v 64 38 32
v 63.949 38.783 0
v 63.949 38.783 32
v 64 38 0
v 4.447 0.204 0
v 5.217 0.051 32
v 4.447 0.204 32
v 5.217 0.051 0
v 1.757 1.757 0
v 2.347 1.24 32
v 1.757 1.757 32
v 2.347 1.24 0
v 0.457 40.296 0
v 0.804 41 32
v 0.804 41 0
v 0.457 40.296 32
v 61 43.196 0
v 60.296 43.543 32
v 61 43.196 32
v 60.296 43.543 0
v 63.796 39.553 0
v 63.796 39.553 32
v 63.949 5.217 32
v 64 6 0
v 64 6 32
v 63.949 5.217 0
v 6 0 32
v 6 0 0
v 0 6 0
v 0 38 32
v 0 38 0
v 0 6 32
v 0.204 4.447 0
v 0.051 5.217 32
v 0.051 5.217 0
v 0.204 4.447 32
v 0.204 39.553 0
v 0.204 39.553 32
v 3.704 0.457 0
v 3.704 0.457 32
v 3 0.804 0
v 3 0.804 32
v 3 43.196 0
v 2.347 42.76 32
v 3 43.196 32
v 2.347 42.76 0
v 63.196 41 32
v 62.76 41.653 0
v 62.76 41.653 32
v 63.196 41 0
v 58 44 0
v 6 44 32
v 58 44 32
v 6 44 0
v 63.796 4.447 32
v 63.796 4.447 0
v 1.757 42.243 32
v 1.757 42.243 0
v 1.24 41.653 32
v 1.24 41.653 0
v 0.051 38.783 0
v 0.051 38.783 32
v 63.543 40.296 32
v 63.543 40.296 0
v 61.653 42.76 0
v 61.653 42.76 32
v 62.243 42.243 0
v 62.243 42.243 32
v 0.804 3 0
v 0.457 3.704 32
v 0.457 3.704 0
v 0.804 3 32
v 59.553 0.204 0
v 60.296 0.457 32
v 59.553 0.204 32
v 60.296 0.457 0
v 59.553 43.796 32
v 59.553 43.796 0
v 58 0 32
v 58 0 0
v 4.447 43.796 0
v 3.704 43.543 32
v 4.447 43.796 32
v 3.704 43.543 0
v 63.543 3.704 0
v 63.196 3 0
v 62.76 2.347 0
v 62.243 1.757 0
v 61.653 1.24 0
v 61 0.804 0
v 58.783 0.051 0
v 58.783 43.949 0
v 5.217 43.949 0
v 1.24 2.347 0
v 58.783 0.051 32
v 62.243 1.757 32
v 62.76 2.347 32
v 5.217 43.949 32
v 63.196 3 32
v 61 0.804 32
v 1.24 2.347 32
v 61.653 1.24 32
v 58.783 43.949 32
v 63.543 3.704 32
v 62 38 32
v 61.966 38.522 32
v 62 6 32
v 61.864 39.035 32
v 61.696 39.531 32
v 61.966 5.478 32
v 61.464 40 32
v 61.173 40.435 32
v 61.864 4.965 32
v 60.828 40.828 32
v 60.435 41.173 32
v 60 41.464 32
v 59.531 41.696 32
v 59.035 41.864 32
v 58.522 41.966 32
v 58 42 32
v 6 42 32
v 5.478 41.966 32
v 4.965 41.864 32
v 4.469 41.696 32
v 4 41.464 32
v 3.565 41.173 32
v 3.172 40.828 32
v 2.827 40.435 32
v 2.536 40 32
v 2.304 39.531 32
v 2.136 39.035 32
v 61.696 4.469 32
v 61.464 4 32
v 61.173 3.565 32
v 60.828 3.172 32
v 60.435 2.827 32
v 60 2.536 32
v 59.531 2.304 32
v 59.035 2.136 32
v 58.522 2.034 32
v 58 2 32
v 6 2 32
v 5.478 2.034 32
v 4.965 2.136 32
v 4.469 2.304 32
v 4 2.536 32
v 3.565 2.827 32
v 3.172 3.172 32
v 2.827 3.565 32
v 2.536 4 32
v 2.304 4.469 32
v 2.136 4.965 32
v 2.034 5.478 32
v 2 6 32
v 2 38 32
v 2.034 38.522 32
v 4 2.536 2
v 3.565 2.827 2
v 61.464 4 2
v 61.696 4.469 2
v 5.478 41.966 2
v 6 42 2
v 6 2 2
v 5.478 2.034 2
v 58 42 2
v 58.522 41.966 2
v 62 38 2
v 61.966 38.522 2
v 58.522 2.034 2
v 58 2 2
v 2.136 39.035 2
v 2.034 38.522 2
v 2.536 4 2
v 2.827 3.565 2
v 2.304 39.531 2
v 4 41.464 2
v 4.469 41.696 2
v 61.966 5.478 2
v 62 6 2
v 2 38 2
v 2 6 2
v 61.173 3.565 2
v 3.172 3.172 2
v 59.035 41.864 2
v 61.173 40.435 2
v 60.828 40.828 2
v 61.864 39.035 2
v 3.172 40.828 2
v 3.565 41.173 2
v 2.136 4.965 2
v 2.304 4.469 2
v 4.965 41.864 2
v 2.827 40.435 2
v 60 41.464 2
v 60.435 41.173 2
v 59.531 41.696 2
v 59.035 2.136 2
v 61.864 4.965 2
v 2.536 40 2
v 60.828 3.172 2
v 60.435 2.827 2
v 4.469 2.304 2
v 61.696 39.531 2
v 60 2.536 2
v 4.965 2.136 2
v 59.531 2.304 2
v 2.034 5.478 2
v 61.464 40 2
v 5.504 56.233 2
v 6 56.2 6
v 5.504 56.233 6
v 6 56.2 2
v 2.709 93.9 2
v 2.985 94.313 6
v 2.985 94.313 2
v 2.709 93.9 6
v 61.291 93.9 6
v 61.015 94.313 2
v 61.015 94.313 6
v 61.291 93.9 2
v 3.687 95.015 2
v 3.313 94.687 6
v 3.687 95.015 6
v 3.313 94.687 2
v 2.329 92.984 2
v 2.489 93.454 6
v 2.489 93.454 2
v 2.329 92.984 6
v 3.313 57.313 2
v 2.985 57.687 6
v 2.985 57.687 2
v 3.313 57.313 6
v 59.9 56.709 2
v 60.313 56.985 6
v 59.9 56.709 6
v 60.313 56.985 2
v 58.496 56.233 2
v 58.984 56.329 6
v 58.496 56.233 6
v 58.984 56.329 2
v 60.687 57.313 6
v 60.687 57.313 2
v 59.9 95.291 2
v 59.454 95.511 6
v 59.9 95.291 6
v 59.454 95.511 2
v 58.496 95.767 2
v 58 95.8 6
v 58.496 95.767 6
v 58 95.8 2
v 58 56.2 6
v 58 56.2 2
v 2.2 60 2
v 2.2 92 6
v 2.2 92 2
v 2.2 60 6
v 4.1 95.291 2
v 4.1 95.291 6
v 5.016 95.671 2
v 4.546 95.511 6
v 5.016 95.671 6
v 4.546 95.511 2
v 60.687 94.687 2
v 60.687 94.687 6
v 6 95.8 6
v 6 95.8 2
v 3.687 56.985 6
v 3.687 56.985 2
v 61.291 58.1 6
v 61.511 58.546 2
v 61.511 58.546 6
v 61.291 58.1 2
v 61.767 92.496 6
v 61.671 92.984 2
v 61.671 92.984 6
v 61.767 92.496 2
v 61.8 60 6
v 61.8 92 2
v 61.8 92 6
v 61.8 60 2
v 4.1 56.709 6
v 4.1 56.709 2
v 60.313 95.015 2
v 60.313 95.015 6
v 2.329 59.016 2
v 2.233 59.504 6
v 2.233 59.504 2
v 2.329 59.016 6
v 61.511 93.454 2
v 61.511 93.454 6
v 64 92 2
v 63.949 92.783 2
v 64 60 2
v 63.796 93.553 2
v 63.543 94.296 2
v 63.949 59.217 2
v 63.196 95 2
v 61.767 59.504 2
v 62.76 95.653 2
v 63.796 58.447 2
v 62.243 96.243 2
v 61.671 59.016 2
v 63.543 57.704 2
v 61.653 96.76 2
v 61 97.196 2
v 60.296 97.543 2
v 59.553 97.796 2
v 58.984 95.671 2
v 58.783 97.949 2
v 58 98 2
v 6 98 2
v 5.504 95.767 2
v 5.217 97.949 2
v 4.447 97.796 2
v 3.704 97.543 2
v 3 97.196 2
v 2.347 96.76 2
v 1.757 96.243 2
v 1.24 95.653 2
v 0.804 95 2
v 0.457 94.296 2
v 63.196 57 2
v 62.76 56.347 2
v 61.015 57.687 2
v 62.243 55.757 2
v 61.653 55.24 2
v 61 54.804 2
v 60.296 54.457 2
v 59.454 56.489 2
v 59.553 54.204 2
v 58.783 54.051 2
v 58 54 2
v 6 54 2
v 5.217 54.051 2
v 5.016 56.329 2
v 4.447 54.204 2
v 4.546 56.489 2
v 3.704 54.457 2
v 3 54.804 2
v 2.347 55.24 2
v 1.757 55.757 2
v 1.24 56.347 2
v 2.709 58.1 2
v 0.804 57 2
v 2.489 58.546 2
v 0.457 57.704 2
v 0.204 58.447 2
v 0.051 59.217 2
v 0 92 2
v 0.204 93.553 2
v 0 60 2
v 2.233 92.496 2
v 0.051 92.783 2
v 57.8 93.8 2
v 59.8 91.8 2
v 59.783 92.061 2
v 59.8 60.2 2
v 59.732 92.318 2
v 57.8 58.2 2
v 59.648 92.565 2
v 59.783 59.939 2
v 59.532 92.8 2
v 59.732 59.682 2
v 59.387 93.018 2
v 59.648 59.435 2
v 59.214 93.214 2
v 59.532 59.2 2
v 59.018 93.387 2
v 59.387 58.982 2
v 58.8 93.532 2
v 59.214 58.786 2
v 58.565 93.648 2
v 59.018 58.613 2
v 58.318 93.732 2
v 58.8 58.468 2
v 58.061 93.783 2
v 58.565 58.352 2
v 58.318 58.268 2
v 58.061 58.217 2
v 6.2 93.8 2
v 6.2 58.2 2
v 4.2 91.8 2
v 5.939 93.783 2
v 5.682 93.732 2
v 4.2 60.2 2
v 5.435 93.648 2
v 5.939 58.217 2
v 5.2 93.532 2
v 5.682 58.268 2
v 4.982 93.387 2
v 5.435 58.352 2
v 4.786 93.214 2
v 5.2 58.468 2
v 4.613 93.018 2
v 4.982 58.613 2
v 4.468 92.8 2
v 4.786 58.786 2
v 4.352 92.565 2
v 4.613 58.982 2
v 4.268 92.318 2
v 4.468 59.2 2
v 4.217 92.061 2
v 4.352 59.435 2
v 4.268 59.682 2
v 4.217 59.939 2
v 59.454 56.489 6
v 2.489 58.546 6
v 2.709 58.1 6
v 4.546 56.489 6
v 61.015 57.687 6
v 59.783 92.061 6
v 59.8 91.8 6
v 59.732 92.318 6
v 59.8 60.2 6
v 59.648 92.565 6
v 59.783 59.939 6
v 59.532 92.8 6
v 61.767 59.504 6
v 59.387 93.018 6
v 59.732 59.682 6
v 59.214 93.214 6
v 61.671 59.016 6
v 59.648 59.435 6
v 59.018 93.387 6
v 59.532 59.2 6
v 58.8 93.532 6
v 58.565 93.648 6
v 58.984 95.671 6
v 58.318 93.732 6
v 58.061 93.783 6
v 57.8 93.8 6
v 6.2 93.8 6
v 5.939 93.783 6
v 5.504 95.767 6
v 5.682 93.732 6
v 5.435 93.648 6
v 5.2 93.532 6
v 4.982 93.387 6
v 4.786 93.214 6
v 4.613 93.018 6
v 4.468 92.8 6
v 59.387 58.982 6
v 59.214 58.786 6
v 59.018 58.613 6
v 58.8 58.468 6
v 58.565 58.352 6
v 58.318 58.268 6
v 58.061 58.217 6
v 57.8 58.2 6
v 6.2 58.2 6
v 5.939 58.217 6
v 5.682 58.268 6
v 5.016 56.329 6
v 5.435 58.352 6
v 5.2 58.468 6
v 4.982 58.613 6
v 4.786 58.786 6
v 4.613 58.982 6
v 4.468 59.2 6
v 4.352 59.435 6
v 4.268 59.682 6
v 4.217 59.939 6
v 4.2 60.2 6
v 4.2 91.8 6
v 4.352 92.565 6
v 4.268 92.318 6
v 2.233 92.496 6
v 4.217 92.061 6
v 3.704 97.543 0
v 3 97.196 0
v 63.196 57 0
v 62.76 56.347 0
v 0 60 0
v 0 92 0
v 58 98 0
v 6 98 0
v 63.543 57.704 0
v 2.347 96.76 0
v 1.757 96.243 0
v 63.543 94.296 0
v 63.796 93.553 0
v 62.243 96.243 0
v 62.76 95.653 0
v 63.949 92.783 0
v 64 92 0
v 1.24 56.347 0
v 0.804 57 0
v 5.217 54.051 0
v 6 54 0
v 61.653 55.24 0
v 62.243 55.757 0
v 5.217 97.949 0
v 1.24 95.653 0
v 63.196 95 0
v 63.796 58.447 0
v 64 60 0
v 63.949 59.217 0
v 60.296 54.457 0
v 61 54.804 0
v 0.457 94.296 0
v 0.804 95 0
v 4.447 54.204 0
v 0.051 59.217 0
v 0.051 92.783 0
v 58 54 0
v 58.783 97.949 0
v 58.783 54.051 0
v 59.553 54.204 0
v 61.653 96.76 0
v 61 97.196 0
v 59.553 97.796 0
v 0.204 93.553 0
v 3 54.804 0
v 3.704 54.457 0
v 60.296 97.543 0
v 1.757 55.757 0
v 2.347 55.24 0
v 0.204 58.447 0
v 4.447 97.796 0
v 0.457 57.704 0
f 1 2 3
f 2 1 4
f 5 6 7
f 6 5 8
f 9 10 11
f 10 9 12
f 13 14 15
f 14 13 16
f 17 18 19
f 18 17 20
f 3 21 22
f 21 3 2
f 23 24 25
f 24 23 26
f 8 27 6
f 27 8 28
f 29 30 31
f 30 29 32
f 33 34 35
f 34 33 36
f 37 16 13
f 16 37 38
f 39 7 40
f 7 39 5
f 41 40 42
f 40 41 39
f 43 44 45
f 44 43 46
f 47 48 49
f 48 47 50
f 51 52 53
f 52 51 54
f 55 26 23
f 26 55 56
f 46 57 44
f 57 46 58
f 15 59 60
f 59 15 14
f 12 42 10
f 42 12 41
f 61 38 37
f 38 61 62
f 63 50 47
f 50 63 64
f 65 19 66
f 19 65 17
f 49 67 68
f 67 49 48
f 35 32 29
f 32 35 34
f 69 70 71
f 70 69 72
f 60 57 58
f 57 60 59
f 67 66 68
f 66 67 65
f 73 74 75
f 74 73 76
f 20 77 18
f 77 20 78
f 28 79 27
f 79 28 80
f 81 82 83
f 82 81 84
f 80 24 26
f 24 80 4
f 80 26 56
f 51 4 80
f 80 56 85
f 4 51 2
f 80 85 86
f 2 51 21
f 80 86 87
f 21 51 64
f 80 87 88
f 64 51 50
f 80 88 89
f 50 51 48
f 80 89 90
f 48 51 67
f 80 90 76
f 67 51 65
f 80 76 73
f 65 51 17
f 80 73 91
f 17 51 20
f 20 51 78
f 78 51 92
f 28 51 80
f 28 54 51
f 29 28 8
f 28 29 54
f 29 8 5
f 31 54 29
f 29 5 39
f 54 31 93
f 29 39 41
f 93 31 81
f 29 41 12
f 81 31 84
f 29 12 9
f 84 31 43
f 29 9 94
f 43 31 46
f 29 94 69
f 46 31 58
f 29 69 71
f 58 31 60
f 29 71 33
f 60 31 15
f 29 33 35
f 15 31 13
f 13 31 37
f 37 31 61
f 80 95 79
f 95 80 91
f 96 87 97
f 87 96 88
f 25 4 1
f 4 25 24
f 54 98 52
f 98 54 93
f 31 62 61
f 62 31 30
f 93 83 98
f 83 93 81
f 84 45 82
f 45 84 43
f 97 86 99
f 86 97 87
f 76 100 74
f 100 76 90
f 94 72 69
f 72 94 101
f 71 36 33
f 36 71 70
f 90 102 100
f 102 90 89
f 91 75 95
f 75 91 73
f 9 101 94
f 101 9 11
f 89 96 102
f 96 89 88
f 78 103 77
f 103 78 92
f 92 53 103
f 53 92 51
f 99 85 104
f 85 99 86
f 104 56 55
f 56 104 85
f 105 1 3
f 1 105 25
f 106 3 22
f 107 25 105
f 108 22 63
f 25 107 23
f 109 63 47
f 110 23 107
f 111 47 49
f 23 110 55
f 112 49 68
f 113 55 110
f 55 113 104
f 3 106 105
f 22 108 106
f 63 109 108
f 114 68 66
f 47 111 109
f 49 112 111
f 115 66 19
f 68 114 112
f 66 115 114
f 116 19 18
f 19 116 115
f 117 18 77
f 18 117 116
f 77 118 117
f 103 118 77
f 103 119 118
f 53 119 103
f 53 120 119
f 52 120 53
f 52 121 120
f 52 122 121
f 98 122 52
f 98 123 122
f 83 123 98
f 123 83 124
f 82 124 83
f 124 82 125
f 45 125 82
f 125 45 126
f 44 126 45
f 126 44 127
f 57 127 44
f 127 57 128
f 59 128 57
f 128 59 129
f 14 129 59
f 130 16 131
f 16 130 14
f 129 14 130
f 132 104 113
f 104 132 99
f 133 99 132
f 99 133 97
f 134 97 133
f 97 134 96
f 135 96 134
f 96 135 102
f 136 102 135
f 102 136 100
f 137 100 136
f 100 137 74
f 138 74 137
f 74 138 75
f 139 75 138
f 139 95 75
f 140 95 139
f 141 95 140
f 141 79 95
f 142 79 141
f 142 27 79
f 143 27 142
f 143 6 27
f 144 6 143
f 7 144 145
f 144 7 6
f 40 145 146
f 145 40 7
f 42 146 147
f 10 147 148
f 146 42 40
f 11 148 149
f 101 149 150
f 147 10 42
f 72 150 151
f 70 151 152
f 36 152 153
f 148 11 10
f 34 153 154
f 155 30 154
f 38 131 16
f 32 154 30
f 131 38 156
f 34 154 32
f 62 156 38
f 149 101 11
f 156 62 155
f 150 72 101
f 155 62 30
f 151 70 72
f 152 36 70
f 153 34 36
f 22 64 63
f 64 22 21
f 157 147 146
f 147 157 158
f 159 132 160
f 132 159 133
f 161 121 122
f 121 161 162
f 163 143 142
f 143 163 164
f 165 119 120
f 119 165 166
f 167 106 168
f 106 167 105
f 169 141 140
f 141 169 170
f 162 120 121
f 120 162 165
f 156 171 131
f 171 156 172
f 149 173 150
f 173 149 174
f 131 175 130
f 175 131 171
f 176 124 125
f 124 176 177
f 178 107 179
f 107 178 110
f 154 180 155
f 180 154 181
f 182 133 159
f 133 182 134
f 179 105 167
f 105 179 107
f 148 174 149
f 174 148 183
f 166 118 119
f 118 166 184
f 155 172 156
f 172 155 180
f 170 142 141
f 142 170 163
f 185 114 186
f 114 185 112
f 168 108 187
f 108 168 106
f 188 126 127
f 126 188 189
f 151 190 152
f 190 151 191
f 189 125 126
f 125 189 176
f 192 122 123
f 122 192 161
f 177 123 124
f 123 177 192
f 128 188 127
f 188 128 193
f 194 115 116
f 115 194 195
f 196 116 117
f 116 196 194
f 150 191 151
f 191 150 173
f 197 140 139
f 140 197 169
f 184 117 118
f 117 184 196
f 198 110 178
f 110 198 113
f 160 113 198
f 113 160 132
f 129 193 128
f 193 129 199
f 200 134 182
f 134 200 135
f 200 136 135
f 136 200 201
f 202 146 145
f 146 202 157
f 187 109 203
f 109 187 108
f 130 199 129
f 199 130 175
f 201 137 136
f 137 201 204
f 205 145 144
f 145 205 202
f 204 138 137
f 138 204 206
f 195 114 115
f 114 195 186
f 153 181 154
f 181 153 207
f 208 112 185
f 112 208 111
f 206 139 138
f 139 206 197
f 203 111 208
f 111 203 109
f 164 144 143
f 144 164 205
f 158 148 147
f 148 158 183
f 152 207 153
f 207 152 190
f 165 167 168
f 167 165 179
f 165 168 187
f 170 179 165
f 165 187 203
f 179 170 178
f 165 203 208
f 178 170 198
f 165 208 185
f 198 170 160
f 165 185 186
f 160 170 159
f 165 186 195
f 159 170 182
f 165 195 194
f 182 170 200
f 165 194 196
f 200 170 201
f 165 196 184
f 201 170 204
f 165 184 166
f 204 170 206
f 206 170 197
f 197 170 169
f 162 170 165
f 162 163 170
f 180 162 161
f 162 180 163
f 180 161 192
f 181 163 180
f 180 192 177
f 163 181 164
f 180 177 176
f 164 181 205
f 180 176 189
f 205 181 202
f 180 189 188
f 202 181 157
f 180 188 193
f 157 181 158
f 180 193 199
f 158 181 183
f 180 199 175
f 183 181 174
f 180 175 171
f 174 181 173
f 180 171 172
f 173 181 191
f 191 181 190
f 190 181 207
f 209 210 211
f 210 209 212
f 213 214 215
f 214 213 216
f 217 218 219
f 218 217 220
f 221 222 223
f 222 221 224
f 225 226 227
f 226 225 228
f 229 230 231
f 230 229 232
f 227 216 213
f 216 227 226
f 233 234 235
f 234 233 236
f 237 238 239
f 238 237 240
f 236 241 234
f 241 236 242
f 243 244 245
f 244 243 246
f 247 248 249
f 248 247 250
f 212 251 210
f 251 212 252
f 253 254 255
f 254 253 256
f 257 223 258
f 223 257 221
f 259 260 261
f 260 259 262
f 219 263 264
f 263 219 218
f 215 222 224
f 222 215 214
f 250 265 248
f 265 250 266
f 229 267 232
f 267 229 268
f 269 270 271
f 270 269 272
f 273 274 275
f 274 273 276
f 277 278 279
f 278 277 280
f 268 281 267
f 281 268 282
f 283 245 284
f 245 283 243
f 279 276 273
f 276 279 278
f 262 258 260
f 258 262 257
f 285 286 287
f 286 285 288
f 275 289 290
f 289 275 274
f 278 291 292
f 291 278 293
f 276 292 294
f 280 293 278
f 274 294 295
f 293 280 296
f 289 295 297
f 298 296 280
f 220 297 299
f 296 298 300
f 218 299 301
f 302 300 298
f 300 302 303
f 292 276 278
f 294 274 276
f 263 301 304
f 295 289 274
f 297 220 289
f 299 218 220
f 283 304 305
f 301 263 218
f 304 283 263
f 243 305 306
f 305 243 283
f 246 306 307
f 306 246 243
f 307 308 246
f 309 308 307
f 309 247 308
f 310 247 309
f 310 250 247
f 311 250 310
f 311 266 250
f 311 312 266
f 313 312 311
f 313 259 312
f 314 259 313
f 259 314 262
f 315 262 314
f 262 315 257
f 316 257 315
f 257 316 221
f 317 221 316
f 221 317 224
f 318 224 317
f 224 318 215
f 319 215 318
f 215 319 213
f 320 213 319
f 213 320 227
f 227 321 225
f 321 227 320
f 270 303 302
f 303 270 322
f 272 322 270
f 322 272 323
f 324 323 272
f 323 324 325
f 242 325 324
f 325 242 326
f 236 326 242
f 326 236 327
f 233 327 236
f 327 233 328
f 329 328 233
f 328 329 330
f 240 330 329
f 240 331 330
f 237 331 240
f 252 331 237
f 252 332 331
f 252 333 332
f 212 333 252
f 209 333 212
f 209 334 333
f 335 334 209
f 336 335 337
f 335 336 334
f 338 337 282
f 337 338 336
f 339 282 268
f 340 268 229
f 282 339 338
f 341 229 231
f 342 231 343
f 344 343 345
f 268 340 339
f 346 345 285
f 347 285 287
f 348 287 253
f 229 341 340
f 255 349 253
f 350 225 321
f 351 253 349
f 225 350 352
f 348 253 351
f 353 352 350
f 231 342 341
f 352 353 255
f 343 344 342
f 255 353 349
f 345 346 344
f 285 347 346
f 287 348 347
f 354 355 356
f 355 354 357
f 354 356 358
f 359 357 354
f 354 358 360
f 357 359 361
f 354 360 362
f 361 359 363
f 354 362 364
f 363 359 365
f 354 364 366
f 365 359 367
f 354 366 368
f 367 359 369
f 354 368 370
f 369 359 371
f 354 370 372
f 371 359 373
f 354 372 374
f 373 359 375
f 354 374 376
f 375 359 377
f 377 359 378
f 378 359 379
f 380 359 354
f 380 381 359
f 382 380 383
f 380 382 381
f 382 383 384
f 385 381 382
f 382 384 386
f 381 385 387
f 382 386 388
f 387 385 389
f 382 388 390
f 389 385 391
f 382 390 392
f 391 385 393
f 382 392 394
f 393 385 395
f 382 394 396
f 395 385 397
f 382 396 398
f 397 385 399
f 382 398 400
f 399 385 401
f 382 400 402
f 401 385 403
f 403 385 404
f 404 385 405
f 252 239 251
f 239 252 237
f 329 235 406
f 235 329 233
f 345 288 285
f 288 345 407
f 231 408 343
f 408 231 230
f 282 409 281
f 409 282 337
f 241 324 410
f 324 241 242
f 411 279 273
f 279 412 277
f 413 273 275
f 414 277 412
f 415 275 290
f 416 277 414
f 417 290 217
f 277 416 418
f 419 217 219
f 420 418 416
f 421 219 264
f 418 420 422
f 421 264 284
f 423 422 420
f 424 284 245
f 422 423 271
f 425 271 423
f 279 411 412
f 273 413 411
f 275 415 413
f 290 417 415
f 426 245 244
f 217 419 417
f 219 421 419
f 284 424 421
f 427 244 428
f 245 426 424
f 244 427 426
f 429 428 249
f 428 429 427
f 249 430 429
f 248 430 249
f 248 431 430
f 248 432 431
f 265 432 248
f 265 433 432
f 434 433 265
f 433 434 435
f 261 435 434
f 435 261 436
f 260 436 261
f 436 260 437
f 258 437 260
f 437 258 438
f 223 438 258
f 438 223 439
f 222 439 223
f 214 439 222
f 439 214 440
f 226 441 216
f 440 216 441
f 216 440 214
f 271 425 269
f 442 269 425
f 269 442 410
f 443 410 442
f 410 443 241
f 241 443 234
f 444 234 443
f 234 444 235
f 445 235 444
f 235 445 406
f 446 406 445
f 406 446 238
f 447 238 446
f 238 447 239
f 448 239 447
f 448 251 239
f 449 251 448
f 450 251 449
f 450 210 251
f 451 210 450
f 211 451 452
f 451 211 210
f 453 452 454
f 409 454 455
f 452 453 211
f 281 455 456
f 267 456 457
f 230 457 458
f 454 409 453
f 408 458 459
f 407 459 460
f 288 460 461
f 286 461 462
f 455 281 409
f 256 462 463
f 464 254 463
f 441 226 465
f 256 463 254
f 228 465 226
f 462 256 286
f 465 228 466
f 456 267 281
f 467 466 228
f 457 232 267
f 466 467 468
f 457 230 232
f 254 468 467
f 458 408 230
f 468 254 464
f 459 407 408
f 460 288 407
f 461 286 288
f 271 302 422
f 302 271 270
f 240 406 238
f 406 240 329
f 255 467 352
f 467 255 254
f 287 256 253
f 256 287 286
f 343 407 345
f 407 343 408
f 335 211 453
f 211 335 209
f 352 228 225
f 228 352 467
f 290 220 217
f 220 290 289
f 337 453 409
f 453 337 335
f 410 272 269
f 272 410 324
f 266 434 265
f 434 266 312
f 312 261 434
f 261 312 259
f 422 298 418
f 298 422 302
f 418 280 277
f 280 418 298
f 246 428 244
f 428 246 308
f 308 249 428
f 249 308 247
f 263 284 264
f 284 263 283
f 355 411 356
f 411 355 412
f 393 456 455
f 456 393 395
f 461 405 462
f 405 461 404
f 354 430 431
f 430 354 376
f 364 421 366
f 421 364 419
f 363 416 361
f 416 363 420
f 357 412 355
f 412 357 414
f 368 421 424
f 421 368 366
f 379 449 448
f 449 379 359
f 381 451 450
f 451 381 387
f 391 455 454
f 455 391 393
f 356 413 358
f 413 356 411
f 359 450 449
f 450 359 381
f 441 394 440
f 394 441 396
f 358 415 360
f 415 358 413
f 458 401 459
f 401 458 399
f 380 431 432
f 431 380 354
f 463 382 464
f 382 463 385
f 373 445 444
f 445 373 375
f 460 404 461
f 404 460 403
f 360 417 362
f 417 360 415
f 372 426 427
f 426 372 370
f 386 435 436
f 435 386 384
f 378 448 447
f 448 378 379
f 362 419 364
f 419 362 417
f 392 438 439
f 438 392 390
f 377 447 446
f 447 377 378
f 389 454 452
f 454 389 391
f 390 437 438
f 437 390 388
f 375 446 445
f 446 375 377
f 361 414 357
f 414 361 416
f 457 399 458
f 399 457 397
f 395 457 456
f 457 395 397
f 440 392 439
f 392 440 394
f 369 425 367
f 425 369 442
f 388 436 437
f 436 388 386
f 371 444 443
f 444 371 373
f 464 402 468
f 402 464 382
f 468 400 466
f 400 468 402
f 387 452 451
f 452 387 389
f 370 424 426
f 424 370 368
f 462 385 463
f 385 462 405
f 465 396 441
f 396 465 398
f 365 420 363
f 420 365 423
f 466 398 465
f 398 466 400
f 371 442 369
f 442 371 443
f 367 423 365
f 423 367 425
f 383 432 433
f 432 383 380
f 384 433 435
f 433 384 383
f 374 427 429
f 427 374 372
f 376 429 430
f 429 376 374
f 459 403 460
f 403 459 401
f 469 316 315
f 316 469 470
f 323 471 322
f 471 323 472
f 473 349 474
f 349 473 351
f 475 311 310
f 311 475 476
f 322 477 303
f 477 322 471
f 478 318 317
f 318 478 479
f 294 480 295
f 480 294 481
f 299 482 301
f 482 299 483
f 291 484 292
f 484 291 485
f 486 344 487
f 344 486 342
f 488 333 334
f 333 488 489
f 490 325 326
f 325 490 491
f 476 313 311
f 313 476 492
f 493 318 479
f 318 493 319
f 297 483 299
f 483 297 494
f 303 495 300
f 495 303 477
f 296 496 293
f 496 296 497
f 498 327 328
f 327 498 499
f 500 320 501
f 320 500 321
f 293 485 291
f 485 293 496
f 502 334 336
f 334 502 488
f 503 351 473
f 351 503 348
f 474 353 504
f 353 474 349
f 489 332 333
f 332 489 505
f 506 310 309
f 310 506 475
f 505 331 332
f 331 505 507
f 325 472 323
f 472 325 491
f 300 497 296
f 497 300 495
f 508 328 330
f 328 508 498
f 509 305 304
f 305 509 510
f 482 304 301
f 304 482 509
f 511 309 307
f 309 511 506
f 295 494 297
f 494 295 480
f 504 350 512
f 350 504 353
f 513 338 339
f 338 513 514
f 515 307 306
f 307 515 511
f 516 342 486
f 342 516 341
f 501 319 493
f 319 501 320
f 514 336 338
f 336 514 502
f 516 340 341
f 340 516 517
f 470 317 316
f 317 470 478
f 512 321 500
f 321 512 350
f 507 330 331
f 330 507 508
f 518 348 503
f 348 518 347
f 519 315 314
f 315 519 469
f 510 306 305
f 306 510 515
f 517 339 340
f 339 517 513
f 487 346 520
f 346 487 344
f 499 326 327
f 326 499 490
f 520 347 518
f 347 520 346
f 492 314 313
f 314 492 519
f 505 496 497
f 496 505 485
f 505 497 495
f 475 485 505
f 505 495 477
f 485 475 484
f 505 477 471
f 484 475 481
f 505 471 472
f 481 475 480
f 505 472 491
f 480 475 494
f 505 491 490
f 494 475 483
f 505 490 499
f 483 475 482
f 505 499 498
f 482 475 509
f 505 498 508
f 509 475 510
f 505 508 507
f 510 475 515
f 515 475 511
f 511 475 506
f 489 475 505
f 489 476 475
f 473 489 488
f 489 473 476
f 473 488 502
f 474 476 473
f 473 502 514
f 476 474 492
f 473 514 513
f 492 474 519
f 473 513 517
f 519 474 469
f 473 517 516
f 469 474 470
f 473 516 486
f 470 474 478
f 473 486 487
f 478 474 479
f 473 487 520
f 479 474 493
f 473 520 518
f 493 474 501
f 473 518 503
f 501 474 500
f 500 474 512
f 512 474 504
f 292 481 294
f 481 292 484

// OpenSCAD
// Box mit Deckel – MESH.ritl Vorlage
/* [Maße] */
// Innenbreite (mm)
breite = 60; // [10:1:200]
// Innentiefe (mm)
tiefe = 40; // [10:1:200]
// Innenhöhe (mm)
hoehe = 30; // [5:1:150]
/* [Ausführung] */
// Wandstärke (mm)
wand = 2; // [0.8:0.2:5]
// Eckenradius (mm)
radius = 4; // [0:0.5:20]
// Deckel mit erzeugen
deckel = true;
// Spiel Deckel (mm)
spiel = 0.2; // [0:0.05:0.6]
/* [Hidden] */
$fn = 48;
module rbox(s, r) {
  rr = min(r, s[0]/2 - 0.01, s[1]/2 - 0.01);
  if (rr <= 0) cube(s);
  else hull() for (x = [rr, s[0]-rr], y = [rr, s[1]-rr]) translate([x, y, 0]) cylinder(r = rr, h = s[2]);
}
difference() {
  rbox([breite + 2*wand, tiefe + 2*wand, hoehe + wand], radius + wand);
  translate([wand, wand, wand]) rbox([breite, tiefe, hoehe + 1], radius);
}
if (deckel) translate([0, tiefe + 2*wand + 10, 0]) {
  rbox([breite + 2*wand, tiefe + 2*wand, wand], radius + wand);
  translate([wand + spiel, wand + spiel, wand]) difference() {
    rbox([breite - 2*spiel, tiefe - 2*spiel, 4], max(radius - spiel, 0));
    translate([wand, wand, -1]) rbox([breite - 2*spiel - 2*wand, tiefe - 2*spiel - 2*wand, 6], max(radius - wand, 0));
  }
}
